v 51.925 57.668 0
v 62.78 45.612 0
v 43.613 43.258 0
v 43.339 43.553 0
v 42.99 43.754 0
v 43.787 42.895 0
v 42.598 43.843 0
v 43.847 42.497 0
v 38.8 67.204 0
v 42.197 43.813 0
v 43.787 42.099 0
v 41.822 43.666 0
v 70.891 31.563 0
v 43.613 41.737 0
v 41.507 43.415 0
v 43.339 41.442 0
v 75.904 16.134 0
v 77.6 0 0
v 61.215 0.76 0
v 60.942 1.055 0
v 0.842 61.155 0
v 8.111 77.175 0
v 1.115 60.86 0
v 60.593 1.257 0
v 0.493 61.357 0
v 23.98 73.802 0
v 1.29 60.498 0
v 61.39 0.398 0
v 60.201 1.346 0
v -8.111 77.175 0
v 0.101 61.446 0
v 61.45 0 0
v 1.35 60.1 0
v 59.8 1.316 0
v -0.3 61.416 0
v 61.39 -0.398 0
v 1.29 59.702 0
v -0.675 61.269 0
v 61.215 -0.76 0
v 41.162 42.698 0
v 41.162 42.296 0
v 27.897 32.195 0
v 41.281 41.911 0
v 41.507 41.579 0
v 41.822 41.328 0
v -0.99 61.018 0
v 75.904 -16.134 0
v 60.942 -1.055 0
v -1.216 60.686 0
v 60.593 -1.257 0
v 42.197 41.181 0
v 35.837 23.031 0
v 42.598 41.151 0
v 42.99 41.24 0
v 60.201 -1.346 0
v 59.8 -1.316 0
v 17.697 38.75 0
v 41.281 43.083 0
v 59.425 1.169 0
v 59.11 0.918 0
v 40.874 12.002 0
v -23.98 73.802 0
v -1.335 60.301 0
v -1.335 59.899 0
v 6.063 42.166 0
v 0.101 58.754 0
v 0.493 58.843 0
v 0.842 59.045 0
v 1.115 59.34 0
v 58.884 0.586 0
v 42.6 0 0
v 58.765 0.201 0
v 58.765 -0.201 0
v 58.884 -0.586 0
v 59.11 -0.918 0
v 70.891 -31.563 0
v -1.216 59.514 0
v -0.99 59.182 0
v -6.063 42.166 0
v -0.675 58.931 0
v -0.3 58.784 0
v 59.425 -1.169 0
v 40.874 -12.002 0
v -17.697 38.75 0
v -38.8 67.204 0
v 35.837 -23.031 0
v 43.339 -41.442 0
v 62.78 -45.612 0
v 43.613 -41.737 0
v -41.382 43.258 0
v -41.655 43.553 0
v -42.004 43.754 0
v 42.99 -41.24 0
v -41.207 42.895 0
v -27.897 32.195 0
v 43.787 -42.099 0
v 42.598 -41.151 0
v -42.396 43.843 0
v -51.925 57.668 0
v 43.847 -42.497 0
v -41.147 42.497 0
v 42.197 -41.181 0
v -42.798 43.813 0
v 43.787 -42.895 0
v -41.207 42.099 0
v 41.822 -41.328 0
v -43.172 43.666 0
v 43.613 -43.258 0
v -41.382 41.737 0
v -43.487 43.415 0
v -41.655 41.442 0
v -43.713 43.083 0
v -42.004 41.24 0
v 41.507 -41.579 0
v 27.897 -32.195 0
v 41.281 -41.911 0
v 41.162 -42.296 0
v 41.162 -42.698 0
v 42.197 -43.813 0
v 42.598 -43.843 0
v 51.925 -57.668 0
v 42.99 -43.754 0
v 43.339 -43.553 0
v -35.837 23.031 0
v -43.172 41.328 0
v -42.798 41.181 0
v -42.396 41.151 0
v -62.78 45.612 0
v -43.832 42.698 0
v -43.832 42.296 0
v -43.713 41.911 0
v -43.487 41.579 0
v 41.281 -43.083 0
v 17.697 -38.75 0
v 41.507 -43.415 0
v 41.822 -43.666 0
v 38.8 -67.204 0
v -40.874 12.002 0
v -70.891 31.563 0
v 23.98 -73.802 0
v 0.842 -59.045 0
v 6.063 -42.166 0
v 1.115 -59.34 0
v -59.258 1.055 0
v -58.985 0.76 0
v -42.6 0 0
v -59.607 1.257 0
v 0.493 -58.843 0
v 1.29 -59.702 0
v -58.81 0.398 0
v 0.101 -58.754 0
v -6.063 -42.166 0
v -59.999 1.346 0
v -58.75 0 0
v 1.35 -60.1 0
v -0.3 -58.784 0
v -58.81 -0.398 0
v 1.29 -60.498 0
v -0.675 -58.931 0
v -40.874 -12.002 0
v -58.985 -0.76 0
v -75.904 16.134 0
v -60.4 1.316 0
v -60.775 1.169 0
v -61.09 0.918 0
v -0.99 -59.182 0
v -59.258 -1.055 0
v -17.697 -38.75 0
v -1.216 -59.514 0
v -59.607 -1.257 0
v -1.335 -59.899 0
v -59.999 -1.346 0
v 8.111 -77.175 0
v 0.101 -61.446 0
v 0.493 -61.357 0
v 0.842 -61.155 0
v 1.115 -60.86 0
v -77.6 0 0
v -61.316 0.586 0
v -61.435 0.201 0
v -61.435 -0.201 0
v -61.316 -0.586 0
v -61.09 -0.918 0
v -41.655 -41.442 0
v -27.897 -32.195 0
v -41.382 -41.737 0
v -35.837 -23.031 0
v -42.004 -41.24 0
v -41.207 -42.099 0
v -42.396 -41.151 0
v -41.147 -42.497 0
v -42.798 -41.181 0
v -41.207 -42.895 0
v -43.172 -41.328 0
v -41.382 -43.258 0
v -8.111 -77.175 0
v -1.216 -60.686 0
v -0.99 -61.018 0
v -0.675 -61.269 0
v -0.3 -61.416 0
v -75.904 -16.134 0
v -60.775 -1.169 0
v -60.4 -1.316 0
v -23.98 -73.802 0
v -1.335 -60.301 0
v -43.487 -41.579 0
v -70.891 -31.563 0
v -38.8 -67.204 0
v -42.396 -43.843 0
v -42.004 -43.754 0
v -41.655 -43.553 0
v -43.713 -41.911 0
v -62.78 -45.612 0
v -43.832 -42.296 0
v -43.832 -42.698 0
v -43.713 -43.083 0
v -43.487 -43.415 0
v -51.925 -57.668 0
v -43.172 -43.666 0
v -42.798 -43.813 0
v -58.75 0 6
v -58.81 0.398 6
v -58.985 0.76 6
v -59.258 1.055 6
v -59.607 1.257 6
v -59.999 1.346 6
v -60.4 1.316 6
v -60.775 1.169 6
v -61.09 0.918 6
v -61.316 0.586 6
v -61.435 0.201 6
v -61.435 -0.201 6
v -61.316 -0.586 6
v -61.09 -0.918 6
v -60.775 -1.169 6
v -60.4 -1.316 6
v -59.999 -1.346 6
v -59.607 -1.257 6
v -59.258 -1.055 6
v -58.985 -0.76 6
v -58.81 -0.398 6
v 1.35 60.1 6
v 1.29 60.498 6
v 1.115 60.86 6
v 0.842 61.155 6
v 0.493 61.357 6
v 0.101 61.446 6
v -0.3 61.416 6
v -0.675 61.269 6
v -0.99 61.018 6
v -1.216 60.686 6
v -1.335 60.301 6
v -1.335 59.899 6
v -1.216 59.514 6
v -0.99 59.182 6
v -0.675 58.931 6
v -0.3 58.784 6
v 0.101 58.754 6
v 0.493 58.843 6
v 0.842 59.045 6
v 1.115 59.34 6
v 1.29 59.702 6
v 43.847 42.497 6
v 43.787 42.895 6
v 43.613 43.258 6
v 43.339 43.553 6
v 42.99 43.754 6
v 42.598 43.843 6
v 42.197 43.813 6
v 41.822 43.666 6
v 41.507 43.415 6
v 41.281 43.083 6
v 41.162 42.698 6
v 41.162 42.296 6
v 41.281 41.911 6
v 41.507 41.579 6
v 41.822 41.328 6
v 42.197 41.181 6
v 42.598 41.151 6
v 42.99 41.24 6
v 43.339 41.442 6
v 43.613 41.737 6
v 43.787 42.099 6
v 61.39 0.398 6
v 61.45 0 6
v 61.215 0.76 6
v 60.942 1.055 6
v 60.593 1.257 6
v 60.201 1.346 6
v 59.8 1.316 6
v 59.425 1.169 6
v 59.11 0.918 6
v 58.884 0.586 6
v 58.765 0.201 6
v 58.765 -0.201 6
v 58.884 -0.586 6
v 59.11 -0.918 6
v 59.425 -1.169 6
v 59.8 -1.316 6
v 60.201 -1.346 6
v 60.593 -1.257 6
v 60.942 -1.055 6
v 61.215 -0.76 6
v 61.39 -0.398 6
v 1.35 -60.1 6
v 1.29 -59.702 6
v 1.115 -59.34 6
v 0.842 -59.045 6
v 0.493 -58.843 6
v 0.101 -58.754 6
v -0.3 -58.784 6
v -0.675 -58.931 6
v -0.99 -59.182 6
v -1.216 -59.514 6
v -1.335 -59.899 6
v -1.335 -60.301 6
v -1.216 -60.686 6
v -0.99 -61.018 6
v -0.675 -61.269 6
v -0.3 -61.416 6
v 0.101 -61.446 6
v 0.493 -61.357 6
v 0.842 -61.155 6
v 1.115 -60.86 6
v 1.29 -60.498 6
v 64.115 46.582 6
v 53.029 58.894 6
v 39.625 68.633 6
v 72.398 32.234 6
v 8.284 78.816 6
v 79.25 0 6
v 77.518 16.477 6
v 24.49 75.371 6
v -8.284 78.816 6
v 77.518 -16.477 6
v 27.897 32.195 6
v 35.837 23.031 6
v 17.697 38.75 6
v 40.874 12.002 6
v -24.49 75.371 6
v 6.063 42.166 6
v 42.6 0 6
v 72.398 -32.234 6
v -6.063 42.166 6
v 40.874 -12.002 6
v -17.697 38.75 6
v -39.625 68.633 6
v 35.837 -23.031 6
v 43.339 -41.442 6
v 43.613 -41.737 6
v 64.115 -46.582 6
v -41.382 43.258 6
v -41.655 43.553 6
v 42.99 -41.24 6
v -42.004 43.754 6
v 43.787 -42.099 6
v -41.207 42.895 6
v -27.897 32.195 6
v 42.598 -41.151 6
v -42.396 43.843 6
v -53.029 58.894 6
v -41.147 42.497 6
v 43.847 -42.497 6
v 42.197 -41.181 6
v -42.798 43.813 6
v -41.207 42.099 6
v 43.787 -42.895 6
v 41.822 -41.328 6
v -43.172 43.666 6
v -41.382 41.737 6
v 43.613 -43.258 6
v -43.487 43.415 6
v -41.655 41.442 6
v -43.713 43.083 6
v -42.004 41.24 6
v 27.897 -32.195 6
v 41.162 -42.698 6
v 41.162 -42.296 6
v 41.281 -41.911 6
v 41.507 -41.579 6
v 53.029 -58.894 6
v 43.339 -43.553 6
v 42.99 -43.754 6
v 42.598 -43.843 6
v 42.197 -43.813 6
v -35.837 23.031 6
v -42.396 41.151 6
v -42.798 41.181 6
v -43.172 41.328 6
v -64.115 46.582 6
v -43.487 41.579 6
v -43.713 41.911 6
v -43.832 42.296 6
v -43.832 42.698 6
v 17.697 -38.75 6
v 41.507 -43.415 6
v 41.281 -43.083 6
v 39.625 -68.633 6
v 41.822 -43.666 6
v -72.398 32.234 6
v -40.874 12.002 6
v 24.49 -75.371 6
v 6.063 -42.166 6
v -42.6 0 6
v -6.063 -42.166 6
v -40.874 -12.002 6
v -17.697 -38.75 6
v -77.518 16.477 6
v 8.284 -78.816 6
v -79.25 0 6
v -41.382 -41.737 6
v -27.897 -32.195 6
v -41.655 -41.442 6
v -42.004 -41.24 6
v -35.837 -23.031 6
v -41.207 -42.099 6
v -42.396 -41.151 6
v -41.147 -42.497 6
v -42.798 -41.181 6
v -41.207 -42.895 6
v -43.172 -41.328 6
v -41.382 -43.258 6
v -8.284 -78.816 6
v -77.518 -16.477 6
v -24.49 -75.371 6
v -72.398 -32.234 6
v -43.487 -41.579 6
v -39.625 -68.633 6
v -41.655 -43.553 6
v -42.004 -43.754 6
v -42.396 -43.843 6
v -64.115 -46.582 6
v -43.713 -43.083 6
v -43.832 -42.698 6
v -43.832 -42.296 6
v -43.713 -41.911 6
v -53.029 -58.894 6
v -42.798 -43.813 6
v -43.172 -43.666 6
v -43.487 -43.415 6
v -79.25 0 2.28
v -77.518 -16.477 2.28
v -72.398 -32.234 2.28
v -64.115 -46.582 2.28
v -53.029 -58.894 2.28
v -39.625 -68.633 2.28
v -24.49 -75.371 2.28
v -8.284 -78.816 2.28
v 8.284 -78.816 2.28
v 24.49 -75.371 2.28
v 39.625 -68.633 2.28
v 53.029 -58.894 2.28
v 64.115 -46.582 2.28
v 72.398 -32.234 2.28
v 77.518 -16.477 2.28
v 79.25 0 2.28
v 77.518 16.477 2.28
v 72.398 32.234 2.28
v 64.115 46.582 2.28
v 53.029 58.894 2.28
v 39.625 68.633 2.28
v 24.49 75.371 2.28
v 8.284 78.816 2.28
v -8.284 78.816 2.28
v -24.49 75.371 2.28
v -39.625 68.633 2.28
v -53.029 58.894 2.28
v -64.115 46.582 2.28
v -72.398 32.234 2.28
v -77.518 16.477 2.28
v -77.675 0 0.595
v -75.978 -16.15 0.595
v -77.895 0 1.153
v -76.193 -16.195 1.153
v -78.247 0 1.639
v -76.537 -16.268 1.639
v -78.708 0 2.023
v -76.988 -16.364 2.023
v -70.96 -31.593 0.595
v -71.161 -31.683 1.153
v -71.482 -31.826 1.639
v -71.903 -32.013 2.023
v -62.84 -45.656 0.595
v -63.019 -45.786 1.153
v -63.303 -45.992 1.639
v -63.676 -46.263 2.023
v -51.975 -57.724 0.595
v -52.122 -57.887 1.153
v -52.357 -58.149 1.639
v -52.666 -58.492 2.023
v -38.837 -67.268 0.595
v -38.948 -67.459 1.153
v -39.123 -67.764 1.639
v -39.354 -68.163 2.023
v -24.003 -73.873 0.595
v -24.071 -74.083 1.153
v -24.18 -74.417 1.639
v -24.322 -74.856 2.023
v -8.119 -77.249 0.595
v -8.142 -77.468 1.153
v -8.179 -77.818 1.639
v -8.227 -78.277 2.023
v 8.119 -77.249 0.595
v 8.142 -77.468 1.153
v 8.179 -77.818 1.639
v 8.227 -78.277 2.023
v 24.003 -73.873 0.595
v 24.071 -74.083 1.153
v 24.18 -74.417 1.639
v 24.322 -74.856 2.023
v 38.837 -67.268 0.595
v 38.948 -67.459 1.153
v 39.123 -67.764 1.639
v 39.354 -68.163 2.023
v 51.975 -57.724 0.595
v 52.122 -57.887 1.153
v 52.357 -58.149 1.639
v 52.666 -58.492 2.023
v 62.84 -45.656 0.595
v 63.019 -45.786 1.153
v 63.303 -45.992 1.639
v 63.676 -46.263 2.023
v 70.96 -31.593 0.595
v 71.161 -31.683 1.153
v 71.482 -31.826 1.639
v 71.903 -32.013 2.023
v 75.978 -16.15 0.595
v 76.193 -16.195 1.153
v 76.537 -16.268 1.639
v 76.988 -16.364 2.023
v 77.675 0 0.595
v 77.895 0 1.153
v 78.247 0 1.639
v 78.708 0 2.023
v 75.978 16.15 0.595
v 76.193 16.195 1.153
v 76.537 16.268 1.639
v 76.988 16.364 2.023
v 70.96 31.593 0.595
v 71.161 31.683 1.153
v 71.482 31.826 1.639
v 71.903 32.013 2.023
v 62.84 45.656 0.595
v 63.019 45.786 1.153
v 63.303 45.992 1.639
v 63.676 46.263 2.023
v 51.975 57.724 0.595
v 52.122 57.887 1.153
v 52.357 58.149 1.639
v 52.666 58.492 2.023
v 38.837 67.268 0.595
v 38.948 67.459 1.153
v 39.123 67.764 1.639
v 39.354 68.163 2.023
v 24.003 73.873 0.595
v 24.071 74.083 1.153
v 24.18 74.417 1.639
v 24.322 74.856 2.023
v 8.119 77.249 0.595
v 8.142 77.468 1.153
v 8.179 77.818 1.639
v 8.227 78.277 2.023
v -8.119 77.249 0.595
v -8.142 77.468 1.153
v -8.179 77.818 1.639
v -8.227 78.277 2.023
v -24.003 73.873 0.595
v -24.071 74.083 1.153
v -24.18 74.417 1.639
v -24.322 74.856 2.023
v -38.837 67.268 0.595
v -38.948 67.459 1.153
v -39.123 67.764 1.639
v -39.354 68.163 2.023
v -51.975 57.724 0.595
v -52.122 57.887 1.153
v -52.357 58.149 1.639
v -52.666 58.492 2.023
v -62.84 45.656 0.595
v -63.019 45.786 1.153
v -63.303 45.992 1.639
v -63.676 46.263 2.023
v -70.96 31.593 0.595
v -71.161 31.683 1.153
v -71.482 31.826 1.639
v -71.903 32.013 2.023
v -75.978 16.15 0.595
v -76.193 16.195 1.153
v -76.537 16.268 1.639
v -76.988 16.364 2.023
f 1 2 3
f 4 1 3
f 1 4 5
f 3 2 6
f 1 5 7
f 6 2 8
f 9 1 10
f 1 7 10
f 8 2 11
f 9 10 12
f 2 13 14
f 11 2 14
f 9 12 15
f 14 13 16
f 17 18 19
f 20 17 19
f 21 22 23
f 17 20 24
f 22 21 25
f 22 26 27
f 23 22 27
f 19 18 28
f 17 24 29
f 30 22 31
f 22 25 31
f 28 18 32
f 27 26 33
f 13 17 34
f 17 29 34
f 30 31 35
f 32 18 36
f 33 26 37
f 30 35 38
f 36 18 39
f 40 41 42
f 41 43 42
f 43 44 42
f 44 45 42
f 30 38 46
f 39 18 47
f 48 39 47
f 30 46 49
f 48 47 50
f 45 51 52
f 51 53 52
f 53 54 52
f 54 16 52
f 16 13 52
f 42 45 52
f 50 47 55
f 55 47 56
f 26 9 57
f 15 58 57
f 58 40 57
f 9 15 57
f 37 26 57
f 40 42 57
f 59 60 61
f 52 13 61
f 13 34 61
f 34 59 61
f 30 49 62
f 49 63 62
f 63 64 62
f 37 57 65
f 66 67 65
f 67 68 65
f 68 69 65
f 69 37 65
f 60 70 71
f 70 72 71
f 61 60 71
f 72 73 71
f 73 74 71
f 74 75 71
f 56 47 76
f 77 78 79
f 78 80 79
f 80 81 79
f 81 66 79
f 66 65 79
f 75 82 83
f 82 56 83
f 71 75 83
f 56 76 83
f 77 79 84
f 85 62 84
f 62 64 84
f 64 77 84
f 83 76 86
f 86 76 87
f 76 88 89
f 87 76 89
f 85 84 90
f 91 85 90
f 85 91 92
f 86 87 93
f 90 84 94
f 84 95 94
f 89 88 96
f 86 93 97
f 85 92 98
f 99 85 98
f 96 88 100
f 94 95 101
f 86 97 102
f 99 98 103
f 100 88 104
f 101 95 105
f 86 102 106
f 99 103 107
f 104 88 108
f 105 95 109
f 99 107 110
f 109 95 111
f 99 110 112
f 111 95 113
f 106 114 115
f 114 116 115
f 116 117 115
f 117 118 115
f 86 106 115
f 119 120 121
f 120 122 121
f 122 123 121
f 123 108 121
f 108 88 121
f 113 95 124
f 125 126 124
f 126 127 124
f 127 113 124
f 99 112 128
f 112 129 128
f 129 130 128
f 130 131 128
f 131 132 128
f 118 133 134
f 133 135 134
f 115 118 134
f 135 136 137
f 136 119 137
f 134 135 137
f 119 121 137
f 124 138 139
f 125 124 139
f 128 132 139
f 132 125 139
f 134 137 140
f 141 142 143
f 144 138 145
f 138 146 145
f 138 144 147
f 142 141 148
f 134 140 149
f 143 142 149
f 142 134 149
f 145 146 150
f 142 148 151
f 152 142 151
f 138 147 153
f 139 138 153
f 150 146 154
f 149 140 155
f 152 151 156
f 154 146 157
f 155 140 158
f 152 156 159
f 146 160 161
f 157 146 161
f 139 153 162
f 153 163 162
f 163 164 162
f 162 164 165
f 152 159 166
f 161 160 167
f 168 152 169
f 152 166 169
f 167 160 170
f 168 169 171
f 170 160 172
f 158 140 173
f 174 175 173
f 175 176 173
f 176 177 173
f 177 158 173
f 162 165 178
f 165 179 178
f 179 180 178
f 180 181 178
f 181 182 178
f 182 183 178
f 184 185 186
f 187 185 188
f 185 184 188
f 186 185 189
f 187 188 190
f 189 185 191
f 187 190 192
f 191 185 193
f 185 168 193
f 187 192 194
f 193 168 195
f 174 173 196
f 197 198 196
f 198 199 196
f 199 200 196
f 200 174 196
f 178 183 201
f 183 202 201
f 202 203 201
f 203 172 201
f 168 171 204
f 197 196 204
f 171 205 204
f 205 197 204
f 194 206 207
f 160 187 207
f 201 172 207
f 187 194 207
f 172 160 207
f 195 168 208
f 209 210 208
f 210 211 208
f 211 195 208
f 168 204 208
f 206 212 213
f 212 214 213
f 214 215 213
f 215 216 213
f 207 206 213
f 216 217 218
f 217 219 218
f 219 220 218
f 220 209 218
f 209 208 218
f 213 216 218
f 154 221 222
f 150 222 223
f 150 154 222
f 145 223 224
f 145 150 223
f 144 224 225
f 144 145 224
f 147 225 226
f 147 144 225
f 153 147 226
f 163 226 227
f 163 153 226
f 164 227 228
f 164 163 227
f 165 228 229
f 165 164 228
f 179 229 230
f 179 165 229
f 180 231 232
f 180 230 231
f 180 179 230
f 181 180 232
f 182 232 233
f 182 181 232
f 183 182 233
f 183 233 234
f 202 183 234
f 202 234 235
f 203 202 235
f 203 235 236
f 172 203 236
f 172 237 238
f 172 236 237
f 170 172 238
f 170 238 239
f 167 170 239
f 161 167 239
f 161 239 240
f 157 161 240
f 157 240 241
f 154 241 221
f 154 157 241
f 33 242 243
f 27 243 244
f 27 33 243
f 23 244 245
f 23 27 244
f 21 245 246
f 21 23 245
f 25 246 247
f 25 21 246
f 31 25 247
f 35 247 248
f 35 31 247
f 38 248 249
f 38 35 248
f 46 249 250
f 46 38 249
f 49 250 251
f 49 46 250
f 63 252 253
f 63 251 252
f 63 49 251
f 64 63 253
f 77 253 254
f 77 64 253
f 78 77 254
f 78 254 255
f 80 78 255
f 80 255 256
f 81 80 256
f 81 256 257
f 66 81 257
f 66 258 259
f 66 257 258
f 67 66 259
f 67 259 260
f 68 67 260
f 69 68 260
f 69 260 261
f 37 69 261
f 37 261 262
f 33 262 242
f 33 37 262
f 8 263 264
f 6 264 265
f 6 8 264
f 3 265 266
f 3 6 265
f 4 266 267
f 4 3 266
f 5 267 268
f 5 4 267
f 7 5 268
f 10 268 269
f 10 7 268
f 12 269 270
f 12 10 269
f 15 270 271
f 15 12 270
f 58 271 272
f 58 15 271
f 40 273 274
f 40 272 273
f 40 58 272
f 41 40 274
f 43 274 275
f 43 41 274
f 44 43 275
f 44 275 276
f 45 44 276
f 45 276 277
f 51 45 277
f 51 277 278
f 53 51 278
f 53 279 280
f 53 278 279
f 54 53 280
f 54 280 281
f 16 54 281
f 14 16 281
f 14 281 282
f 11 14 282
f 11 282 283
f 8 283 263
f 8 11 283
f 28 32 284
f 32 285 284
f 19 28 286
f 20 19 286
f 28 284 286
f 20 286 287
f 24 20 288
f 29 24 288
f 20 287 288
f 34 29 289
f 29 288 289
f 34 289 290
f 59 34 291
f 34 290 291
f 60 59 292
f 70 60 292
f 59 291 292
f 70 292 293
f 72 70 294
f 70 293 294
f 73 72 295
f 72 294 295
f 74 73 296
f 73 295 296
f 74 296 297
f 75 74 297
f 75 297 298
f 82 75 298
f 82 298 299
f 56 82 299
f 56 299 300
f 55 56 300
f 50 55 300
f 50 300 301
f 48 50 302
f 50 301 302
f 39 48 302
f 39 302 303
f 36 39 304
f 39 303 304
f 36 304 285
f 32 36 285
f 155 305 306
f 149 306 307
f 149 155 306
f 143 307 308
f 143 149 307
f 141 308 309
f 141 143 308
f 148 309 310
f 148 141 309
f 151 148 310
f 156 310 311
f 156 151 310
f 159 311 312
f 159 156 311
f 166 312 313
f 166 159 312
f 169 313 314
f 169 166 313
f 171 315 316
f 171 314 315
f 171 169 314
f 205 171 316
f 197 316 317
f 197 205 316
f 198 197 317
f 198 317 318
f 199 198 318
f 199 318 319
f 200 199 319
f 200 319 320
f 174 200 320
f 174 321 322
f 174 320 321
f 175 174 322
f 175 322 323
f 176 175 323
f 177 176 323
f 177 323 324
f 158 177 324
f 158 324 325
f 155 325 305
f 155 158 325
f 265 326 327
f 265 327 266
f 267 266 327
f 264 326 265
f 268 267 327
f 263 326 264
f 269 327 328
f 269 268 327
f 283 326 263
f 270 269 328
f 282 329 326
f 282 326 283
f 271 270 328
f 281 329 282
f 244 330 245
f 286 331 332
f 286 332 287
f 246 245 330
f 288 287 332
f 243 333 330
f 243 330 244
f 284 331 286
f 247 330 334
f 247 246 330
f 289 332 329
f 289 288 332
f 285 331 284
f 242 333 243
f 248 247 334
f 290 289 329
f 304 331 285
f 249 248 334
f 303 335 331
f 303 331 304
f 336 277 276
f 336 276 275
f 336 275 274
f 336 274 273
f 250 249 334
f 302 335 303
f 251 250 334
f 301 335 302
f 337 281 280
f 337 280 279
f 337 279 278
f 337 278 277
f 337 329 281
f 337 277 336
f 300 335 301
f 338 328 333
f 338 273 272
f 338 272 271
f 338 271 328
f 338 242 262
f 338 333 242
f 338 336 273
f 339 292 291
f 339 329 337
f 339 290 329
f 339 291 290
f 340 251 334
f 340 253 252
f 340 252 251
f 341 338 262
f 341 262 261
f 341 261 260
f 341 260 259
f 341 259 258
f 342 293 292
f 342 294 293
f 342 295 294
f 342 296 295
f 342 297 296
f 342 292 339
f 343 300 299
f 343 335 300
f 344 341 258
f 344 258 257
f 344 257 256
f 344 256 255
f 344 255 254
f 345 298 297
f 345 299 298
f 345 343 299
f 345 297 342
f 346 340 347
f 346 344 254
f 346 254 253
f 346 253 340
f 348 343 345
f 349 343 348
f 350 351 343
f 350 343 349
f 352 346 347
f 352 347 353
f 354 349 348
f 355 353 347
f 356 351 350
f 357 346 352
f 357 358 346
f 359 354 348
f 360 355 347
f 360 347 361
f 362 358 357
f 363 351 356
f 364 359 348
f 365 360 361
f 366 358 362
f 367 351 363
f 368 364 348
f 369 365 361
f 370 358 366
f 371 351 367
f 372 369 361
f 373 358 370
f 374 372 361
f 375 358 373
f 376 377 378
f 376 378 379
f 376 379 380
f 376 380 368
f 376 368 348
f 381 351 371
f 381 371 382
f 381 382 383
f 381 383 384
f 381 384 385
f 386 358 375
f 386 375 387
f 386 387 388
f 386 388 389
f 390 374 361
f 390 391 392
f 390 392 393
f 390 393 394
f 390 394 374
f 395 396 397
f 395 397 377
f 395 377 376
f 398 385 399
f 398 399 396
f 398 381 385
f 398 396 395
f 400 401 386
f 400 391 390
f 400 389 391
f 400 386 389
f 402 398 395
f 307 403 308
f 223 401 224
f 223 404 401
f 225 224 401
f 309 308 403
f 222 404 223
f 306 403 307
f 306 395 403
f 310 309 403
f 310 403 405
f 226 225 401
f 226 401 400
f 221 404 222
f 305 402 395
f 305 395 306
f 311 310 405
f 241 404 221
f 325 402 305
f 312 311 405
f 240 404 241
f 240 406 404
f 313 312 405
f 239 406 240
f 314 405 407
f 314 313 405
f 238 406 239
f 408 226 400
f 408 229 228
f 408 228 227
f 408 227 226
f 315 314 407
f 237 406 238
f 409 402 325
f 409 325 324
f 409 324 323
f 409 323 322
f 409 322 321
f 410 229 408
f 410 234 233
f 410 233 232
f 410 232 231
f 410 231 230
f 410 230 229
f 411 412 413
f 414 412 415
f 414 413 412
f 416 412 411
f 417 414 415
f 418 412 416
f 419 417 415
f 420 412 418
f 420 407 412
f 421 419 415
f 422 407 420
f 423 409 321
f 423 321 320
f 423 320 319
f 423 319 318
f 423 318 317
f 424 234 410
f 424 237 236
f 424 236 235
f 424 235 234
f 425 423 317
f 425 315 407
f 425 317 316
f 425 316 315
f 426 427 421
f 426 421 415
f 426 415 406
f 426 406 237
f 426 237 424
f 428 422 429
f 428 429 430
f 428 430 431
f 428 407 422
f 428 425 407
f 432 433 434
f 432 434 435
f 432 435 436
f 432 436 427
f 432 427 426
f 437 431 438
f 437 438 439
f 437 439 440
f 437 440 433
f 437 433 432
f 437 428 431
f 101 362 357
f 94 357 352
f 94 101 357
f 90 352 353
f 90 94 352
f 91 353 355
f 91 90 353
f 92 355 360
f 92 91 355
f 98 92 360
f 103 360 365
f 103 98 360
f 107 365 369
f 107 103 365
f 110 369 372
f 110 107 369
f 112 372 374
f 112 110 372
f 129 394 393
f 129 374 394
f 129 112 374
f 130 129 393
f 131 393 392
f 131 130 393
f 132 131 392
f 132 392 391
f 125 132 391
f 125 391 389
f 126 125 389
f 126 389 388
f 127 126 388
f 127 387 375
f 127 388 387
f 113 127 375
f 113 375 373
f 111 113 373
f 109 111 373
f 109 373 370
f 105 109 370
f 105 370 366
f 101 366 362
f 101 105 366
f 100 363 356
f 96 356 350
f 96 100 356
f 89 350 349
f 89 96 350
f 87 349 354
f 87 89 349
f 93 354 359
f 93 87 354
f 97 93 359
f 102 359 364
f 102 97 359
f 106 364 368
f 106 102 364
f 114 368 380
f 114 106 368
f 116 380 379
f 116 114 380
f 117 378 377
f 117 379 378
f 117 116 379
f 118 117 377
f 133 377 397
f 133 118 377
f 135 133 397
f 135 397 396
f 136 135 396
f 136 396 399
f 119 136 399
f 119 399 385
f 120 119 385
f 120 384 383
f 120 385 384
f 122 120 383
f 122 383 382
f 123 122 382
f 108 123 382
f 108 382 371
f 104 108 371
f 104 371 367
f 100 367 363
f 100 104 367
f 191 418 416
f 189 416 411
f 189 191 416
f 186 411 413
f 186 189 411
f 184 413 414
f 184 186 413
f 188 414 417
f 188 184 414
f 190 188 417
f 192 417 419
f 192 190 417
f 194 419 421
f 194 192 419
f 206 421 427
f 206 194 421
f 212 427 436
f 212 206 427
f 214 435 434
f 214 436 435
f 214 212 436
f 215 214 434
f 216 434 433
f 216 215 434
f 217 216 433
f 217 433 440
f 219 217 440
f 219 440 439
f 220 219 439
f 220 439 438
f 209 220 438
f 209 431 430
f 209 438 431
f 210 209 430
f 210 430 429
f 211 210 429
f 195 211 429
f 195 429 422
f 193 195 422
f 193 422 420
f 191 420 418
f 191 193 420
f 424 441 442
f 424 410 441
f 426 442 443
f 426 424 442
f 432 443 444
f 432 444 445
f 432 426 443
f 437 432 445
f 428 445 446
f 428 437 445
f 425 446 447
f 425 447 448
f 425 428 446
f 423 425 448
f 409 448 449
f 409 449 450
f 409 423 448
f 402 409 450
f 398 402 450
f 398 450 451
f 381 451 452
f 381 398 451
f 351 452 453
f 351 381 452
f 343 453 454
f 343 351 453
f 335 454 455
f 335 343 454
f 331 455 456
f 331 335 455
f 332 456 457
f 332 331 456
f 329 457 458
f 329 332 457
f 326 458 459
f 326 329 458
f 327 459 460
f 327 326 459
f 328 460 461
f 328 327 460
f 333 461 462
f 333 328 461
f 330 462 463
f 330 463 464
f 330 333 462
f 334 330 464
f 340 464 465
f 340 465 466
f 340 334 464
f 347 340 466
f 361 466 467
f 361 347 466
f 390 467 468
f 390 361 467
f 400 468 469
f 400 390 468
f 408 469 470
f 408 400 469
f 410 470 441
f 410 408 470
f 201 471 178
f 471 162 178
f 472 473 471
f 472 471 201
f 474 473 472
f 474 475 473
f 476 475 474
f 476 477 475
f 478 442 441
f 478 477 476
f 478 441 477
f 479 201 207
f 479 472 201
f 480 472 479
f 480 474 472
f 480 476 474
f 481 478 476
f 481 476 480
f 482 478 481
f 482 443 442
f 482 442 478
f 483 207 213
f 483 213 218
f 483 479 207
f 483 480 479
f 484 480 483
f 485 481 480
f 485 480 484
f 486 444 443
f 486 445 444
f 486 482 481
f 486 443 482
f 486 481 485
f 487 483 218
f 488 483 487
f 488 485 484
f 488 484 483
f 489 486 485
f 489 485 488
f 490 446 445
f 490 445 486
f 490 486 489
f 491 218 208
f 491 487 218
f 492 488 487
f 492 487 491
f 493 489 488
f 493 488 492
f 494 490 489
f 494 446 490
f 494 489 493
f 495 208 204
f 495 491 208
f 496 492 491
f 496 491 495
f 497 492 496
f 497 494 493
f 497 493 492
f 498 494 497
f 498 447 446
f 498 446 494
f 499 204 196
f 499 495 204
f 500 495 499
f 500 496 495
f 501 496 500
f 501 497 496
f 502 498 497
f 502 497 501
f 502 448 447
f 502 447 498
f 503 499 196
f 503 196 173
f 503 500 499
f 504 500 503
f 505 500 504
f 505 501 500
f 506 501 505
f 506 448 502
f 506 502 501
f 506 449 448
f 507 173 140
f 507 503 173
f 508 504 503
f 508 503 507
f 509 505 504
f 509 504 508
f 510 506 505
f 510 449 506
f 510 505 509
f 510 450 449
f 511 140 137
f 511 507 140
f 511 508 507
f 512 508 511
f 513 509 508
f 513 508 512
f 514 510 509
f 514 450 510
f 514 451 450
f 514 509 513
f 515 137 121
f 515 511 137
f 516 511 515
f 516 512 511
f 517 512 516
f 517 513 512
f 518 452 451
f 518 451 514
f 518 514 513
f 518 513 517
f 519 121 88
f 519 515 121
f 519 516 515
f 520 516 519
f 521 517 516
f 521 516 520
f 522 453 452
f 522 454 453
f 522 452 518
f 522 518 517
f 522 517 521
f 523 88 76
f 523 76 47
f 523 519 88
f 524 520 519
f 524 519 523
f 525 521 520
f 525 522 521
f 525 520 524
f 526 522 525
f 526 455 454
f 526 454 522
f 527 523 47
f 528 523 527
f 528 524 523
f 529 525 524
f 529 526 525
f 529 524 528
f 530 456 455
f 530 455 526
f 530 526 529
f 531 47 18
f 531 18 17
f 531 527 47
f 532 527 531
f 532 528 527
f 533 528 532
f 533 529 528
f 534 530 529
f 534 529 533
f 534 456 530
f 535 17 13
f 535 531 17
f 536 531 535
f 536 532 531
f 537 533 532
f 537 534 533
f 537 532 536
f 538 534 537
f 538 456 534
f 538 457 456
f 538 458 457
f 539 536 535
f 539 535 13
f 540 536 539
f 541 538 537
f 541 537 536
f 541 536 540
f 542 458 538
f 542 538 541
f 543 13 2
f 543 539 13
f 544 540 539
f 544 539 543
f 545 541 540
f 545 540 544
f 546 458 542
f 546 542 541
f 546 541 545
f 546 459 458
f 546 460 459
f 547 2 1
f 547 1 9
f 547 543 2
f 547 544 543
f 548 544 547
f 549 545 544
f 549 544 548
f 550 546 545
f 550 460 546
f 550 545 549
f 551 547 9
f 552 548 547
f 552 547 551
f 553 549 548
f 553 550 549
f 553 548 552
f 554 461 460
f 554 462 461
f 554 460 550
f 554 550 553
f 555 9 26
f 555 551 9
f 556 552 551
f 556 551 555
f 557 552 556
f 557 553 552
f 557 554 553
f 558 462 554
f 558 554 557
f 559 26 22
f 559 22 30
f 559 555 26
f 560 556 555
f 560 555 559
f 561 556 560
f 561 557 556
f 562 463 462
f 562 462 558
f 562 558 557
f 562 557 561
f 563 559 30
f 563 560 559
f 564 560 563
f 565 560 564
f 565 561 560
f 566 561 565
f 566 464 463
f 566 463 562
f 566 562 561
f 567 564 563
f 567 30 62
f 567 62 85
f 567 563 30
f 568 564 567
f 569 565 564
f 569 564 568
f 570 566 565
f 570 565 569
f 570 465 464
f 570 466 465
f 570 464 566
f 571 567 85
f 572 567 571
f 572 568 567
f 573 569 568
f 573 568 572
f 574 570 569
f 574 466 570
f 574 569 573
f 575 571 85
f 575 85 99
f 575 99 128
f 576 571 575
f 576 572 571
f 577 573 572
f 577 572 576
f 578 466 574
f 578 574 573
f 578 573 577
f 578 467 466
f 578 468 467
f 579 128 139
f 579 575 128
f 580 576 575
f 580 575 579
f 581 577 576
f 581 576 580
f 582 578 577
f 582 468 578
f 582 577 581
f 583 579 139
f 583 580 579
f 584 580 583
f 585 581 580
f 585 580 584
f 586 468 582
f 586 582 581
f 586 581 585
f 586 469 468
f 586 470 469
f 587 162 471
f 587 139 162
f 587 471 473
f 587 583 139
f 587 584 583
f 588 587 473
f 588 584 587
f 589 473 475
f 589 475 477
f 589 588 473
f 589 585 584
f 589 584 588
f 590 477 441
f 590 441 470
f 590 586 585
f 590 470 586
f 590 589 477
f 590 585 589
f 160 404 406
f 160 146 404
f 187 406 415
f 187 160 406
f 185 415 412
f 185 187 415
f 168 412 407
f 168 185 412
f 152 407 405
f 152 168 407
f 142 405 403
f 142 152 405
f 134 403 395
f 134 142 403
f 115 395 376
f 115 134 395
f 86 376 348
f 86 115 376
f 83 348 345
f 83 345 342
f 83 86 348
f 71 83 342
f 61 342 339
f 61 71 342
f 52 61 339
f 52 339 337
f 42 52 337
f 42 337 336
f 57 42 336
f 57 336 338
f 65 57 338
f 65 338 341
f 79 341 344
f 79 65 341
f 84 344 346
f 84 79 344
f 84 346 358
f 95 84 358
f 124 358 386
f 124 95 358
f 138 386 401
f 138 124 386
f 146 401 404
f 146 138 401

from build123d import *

# Parameters (mm, degrees)
SKETCH003_R   = 1.35
EXTRUDE_DEPTH = 30


with BuildPart() as hole_cut:
    # Sketch003 → Extrude (new body, symmetric)
    with BuildSketch(Plane.XY):
        with Locations((42.497118, 42.497118)):
            Circle(SKETCH003_R)
        with Locations((0, 60.1)):
            Circle(SKETCH003_R)
        with Locations((-42.497118, 42.497118)):
            Circle(SKETCH003_R)
        with Locations((-60.1, 0)):
            Circle(SKETCH003_R)
        with Locations((-42.497118, -42.497118)):
            Circle(SKETCH003_R)
        with Locations((0, -60.1)):
            Circle(SKETCH003_R)
        with Locations((42.497118, -42.497118)):
            Circle(SKETCH003_R)
        with Locations((60.1, 0)):
            Circle(SKETCH003_R)
    extrude(amount=EXTRUDE_DEPTH, both=True)


with BuildPart() as bearing_inner_race_upper:
    # Sketch → Revolve (revolve)
    with BuildSketch(Plane.XZ):
        with BuildLine():
            ThreePointArc((-77.6, 0), (-78.055778, 1.407125), (-79.25, 2.279803))
            Line((-79.25, 2.279803), (-79.25, 6))
            Line((-79.25, 6), (-42.6, 6))
            Line((-42.6, 6), (-42.6, 0))
            Line((-77.6, 0), (-42.6, 0))
        make_face()
    revolve(axis=Axis((0, 0, 0), (0, 0, 1)))

    # Cut: cut hole cut
    add(hole_cut.part, mode=Mode.SUBTRACT)


solid = bearing_inner_race_upper.part
